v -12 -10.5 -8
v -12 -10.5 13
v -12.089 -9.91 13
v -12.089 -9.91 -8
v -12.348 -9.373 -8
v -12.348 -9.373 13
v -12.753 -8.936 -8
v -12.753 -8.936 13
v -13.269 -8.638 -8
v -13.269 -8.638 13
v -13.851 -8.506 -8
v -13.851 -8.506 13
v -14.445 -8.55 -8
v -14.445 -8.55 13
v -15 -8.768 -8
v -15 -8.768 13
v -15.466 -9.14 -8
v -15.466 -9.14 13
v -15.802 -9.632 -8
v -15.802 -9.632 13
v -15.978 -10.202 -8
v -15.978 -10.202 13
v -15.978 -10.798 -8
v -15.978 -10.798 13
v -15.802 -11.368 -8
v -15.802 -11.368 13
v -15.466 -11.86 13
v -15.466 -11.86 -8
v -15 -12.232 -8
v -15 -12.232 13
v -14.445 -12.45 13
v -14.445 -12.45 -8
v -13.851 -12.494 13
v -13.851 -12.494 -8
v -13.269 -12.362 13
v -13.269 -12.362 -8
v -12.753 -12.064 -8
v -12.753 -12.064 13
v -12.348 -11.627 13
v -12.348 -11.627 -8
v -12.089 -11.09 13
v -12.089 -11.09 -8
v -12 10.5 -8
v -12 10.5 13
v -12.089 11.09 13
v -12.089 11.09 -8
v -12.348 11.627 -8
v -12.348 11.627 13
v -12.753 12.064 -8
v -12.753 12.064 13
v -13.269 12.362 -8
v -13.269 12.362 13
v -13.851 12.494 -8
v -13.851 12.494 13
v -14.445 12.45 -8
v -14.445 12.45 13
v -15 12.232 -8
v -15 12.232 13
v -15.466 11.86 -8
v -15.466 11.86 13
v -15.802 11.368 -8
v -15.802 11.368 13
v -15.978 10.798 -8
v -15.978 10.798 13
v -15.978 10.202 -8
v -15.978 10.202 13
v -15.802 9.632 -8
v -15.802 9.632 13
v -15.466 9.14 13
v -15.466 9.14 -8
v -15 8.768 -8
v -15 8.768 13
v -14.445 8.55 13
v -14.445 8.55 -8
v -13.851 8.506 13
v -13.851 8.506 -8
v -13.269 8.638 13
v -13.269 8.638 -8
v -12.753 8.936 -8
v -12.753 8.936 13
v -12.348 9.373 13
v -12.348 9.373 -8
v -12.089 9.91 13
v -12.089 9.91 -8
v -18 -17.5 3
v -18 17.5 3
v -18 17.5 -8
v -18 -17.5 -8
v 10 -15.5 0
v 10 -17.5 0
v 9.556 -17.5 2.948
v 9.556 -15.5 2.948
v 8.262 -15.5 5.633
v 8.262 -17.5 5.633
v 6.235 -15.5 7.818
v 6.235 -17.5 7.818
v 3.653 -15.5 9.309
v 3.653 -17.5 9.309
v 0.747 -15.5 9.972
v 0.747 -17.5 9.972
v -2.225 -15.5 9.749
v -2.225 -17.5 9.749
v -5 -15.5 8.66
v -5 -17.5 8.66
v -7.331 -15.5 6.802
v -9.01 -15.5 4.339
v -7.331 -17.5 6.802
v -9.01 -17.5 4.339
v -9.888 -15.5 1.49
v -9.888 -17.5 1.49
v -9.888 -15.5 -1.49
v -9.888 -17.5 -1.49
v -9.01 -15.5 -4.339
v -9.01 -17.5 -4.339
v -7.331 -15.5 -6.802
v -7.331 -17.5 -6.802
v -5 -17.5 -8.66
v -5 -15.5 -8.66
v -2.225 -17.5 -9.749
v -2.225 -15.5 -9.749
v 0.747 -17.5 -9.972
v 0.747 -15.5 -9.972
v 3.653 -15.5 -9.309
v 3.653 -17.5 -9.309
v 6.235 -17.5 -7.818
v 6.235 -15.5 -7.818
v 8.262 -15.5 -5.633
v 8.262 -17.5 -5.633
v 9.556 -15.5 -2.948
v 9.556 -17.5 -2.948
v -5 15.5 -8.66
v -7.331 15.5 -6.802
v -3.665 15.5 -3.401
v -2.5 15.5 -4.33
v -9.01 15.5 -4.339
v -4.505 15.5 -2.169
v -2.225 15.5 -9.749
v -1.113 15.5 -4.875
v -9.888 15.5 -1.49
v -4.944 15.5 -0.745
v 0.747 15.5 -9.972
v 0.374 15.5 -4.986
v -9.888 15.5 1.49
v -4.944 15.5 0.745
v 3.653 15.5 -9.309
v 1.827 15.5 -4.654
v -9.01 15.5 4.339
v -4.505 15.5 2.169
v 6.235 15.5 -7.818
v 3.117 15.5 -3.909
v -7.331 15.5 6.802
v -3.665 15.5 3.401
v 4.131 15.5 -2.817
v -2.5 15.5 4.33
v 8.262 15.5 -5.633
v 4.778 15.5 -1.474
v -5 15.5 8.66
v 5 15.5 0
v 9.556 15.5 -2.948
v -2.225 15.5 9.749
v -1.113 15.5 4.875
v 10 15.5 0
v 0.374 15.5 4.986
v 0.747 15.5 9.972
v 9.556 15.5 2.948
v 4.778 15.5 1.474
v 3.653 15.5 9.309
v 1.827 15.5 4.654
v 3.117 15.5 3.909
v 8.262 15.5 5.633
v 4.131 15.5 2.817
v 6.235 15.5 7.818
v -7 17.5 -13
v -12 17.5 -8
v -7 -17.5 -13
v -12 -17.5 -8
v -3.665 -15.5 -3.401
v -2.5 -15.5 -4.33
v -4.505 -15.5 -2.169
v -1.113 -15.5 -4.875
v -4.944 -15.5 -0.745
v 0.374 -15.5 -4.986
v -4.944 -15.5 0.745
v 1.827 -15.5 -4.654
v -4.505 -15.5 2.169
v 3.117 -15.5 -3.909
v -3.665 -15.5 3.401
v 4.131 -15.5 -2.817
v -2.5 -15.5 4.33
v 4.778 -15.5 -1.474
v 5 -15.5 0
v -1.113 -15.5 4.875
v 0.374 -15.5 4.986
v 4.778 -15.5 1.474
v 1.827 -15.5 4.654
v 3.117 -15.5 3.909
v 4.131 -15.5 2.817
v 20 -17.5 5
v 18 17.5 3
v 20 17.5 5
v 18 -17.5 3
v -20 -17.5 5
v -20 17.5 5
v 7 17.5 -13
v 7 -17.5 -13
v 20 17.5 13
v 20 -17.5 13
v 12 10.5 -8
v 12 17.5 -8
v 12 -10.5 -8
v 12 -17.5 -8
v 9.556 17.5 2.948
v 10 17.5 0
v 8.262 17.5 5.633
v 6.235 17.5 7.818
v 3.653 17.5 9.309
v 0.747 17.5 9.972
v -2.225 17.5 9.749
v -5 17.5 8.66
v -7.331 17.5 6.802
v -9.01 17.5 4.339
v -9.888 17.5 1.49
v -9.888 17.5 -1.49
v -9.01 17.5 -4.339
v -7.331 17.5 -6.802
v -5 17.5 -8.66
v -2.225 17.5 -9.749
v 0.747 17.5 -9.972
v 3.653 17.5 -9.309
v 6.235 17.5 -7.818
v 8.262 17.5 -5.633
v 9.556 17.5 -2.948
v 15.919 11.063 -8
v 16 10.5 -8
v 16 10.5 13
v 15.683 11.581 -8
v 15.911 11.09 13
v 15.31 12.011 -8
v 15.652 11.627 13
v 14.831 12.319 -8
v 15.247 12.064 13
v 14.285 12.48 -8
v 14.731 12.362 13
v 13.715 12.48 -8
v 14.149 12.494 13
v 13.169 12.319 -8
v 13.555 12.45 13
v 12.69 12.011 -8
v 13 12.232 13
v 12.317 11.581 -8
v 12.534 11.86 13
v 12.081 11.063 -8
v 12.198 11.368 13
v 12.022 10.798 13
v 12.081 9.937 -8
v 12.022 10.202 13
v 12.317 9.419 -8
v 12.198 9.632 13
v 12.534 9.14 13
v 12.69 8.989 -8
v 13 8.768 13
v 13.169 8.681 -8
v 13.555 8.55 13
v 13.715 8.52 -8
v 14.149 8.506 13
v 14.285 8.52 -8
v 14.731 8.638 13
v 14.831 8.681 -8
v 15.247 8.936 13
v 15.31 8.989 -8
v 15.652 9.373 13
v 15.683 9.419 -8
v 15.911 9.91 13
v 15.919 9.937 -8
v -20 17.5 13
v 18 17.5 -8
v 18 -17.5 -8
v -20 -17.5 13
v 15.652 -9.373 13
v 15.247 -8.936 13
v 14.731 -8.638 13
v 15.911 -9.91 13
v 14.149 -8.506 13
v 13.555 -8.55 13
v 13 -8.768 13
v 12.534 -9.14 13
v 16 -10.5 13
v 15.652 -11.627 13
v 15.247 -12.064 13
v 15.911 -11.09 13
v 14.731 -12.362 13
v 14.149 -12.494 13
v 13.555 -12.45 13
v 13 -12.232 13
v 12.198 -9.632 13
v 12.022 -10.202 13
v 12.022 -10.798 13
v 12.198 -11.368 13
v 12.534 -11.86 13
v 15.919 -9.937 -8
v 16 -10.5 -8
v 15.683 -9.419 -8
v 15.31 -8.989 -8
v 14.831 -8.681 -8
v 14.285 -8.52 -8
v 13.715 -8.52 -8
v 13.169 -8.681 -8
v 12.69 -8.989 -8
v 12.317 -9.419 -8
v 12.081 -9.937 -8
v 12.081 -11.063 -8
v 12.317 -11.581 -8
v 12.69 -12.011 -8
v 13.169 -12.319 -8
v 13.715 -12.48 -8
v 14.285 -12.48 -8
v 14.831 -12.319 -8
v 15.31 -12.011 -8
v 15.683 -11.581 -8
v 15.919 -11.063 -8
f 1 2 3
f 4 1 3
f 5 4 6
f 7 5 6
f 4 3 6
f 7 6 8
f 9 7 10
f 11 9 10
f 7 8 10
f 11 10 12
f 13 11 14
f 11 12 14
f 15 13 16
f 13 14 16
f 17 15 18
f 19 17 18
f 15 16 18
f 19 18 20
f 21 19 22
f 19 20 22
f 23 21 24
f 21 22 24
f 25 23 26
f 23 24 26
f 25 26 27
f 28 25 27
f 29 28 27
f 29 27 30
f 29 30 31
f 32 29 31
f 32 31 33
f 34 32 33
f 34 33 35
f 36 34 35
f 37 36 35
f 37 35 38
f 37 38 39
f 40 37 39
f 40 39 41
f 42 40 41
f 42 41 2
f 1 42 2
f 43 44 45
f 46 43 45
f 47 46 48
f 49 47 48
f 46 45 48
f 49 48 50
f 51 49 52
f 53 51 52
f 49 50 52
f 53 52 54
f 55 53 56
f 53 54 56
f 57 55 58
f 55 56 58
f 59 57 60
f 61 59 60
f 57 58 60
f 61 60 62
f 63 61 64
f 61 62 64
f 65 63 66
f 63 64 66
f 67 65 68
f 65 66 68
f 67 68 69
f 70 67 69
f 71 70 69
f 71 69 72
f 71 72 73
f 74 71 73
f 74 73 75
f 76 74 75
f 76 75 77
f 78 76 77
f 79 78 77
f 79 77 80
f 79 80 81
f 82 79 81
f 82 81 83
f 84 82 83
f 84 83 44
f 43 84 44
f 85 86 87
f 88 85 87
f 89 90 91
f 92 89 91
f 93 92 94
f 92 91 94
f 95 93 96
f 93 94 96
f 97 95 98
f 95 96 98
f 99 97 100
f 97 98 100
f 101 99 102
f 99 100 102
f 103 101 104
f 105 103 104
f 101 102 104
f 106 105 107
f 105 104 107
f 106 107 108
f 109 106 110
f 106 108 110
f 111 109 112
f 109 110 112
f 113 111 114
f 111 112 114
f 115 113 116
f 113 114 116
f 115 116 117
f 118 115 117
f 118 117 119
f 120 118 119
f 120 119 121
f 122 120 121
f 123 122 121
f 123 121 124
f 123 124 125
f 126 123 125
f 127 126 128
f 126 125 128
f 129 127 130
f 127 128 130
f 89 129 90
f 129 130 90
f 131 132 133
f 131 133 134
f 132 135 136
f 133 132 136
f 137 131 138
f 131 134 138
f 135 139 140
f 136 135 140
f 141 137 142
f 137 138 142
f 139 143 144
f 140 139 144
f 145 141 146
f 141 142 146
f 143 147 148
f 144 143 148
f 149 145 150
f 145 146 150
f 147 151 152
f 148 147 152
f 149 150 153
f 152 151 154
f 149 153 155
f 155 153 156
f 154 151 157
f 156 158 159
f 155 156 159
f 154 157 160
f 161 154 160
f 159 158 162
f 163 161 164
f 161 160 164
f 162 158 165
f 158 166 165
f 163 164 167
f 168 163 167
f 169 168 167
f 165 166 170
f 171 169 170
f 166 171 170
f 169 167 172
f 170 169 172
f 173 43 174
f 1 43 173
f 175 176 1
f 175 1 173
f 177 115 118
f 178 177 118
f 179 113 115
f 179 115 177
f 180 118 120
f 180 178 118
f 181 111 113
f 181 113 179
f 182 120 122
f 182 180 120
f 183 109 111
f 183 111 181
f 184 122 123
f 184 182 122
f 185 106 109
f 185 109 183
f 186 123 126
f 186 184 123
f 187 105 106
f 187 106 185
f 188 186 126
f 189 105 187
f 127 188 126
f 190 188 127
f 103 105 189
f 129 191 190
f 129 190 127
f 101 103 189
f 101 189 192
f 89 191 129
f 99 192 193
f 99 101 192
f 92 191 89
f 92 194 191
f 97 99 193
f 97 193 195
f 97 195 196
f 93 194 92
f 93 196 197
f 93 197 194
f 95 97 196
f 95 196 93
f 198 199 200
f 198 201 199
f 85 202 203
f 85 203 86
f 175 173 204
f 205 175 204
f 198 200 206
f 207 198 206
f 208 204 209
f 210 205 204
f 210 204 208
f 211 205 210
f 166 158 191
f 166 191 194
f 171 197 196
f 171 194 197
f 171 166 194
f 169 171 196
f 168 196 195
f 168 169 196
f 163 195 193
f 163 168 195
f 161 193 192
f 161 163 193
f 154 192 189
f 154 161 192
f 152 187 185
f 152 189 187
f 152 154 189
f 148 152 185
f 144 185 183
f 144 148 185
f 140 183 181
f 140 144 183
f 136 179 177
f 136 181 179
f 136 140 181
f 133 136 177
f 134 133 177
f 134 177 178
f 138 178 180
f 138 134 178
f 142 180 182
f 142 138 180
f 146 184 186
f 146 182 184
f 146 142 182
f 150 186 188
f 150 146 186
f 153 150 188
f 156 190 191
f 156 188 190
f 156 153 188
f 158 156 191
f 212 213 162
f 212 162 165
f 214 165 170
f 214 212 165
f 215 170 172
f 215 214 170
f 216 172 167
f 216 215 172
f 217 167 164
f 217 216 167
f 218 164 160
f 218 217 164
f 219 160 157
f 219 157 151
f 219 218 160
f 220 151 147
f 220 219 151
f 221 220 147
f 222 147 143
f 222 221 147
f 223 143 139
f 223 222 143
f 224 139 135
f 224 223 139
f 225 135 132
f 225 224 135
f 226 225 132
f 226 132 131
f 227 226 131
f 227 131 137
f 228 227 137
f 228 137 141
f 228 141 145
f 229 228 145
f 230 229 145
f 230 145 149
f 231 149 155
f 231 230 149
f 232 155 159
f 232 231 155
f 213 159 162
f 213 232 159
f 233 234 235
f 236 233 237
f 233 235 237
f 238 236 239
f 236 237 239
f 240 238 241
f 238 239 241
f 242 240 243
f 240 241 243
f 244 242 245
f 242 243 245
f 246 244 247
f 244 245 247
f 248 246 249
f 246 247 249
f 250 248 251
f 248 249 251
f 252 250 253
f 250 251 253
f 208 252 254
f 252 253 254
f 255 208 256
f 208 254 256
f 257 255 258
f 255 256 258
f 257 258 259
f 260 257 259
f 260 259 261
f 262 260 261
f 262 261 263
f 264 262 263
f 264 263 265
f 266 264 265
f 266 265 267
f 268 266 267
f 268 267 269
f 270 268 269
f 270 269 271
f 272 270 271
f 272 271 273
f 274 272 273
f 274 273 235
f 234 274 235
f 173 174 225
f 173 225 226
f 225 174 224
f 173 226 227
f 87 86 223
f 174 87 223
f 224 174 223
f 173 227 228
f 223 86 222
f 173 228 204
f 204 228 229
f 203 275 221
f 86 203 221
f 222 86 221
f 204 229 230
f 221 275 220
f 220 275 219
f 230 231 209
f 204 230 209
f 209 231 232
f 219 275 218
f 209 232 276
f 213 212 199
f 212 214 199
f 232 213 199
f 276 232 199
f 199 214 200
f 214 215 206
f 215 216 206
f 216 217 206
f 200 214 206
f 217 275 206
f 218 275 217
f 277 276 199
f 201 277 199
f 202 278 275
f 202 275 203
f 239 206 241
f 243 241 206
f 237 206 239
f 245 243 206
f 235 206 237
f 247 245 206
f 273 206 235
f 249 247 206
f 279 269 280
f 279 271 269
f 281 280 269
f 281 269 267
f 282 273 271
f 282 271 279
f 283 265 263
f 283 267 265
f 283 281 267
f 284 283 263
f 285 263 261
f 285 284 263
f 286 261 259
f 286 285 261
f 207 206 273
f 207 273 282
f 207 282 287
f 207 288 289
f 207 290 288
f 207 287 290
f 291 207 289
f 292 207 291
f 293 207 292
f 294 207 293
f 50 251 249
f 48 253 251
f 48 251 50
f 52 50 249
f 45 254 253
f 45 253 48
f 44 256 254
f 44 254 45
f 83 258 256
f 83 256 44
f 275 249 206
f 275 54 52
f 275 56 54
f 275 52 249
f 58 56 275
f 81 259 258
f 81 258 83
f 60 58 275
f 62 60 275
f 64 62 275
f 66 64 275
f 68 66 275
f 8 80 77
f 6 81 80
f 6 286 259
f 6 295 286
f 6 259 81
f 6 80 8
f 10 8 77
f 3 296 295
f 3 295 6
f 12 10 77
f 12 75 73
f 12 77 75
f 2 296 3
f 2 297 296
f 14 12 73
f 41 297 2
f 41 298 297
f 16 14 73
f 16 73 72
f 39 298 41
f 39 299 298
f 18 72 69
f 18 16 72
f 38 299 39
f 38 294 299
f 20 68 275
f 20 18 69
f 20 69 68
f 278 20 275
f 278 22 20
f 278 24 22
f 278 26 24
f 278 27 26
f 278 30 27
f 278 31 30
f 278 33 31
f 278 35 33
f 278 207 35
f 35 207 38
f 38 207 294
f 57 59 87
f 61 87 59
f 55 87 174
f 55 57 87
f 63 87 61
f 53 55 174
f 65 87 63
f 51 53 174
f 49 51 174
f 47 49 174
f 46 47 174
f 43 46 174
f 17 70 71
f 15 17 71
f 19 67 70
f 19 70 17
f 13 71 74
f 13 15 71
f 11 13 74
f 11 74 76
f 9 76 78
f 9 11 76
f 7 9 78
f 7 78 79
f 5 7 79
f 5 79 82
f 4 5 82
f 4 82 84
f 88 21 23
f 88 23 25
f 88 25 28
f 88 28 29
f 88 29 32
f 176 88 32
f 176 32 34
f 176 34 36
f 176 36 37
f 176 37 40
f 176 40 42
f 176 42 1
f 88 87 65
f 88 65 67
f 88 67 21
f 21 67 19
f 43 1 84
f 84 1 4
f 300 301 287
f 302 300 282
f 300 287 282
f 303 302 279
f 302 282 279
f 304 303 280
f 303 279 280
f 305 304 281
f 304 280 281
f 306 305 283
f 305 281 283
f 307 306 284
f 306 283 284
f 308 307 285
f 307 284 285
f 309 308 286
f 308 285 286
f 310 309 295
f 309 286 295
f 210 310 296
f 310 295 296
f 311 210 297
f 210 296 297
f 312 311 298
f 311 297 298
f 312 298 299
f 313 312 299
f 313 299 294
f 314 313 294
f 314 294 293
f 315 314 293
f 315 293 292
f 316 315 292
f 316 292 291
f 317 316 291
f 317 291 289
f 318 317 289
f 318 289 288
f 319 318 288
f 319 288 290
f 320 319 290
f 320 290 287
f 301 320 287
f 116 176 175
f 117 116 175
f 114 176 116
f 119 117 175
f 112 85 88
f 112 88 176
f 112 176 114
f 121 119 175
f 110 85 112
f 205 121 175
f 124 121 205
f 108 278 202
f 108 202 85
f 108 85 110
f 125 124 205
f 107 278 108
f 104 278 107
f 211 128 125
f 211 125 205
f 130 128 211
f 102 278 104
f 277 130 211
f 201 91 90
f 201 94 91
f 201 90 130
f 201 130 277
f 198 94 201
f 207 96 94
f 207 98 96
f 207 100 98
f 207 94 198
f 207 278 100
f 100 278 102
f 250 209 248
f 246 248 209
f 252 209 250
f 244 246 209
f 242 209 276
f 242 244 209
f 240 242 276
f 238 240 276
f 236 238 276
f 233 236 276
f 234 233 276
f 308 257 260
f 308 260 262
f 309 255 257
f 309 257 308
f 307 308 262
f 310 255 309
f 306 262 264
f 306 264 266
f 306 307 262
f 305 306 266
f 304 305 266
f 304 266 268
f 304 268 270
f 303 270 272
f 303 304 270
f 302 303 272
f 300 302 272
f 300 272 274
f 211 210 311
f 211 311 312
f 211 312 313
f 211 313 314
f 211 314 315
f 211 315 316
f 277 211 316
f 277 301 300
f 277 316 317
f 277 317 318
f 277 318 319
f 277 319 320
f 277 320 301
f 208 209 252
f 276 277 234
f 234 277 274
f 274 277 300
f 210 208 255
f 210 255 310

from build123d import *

# Parameters (mm, degrees)
F0_R     = 5
F1_DEPTH = 17.5
F2_R     = 10
F3_DEPTH = 2
F4_R     = 2
F5_DEPTH = 25


# Not quite as in the source:
# - a pattern or mirror of a feature is missing from the dataset's text; its kind, count and spacing are read off the source's solid


with BuildPart() as f1:
    # F0 (on Front) → F1 (new body, symmetric)
    with BuildSketch(Plane.XZ):
        Polygon((20, 13), (0, 13), (-20, 13), (-20, 5), (-18, 3), (-18, -8), (-12, -8), (-7, -13), (0, -13), (7, -13), (12, -8), (18, -8), (18, 3), (20, 5), align=None)
        Circle(F0_R, mode=Mode.SUBTRACT)
    extrude(amount=F1_DEPTH, both=True)

    # F2 (on face) → F3 (cut)
    with BuildSketch(Plane.XZ.offset(17.5)):
        Circle(F2_R)
    f3 = extrude(amount=-F3_DEPTH, mode=Mode.SUBTRACT)

    # F3_copies: F3 across plane
    add(f3.mirror(Plane.ZX), mode=Mode.SUBTRACT)

    # F4 (on face) → F5 (cut)
    with BuildSketch(Plane.XY.offset(13)):
        with Locations((-14, 10.5)):
            Circle(F4_R)
        with Locations((-14, -10.5)):
            Circle(F4_R)
        with Locations((14, 10.5)):
            Circle(F4_R)
        with Locations((14, -10.5)):
            Circle(F4_R)
    extrude(amount=-F5_DEPTH, mode=Mode.SUBTRACT)


solid = f1.part
